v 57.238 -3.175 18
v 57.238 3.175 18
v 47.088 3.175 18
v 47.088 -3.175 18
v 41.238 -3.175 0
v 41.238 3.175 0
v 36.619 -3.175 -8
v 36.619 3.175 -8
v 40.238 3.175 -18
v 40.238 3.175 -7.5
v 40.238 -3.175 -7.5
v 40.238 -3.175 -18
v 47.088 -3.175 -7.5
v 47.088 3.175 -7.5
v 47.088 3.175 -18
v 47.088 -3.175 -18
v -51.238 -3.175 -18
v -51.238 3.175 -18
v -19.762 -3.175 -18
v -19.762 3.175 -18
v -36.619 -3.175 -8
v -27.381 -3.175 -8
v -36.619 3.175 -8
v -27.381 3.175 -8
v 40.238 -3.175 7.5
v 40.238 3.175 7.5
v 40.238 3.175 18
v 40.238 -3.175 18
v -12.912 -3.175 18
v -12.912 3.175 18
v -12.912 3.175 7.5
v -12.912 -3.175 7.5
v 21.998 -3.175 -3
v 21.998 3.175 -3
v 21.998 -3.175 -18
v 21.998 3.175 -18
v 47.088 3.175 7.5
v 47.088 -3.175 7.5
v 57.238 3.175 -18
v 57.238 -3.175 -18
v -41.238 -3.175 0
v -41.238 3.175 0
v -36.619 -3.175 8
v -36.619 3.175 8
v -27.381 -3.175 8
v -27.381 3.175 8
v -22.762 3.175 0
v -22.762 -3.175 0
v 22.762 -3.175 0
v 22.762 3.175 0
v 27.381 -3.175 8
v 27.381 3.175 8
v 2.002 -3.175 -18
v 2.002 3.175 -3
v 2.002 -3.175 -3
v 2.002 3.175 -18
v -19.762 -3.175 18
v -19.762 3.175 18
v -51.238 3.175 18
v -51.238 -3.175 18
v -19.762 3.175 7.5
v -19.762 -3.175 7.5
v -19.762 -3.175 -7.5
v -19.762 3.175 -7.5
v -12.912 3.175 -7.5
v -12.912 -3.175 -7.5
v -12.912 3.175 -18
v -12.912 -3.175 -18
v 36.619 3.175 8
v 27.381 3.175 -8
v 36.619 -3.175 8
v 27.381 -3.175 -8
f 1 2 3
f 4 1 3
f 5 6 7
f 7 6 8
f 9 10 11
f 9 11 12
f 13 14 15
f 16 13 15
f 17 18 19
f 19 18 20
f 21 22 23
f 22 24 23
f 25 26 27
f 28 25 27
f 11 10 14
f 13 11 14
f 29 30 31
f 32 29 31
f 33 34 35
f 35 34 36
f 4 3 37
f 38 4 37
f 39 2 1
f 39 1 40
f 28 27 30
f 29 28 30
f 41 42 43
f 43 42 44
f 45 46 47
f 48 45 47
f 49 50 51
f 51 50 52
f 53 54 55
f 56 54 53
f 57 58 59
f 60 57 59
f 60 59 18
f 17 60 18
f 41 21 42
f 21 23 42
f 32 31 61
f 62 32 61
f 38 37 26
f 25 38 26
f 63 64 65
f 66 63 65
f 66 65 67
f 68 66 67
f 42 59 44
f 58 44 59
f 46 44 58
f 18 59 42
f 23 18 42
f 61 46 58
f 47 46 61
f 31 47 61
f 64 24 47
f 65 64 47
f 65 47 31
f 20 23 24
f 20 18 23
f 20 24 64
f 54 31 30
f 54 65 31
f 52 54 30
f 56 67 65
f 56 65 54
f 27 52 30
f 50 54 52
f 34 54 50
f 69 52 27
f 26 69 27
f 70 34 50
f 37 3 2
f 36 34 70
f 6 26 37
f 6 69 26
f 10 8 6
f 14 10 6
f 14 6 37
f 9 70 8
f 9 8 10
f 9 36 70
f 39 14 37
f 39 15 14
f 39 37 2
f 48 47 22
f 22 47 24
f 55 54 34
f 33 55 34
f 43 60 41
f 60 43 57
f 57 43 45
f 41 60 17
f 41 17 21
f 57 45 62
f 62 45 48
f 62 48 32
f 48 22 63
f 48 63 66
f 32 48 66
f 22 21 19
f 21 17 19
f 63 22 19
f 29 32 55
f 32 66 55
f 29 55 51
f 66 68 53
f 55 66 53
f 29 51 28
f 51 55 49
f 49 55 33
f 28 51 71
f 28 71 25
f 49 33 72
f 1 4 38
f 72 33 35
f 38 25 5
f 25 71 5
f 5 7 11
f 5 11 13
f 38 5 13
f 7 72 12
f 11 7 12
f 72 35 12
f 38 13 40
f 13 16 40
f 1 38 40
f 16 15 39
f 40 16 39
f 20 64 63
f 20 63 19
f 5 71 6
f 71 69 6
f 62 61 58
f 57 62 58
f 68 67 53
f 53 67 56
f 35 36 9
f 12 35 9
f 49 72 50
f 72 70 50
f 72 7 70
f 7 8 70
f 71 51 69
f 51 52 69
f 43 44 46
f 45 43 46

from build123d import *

# Parameters (mm, degrees)
SKETCH1_W           = 108.475208614
SKETCH1_H           = 90.5
BOSS_EXTRUDE1_DEPTH = 3.175
SKETCH2_W           = 6.85
SKETCH2_H           = 10.5
CUT_EXTRUDE1_DEPTH  = 93.588961798
LPATTERN1_COUNT     = 2
LPATTERN1_PITCH     = 60
SKETCH3_W           = 19.995208614
SKETCH3_H           = 15
CUT_EXTRUDE2_DEPTH  = 93.588961798
SKETCH4_W           = 6.85
SKETCH4_H           = 10.5
CUT_EXTRUDE3_DEPTH  = 93.588961798
SHORT_DEPTH         = 93.588961798


with BuildPart() as part:
    # Sketch1 → Boss-Extrude1 (new, symmetric)
    with BuildSketch(Plane(origin=(0, 0, 0), x_dir=(1, 0, 0), z_dir=(0, 1, 0))):
        with Locations((3, -27.25)):
            Rectangle(SKETCH1_W, SKETCH1_H)
        Polygon((-22.762395693, 0), (-27.381197846, 8), (-36.618802154, 8), (-41.237604307, 0), (-36.618802154, -8), (-27.381197846, -8), align=None, mode=Mode.SUBTRACT)
        Polygon((41.237604307, 0), (36.618802154, 8), (27.381197846, 8), (22.762395693, 0), (27.381197846, -8), (36.618802154, -8), align=None, mode=Mode.SUBTRACT)
    extrude(amount=BOSS_EXTRUDE1_DEPTH, both=True)

    # Sketch2 → Cut-Extrude1 (cut, through all)
    with BuildSketch(Plane(origin=(0, 3.175, 0), x_dir=(1, 0, 0), z_dir=(0, 1, 0))):
        with Locations((-16.337395693, 12.75)):
            Rectangle(SKETCH2_W, SKETCH2_H)
        with Locations((-16.337395693, -67.25)):
            Rectangle(SKETCH2_W, SKETCH2_H)
        with Locations((-16.337395693, -27.25)):
            Rectangle(SKETCH2_W, SKETCH2_H)
    cut_extrude1 = extrude(amount=-CUT_EXTRUDE1_DEPTH, mode=Mode.SUBTRACT)

    # LPattern1: Cut-Extrude1 ×2
    with Locations(*[(i * LPATTERN1_PITCH, 0, 0) for i in range(1, LPATTERN1_COUNT)]):
        add(cut_extrude1, mode=Mode.SUBTRACT)

    # Sketch3 → Cut-Extrude2 (cut, through all)
    with BuildSketch(Plane(origin=(0, 3.175, 0), x_dir=(1, 0, 0), z_dir=(0, 1, 0))):
        with Locations((12, 10.5)):
            Rectangle(SKETCH3_W, SKETCH3_H)
    extrude(amount=-CUT_EXTRUDE2_DEPTH, mode=Mode.SUBTRACT)

    # Sketch4 → Cut-Extrude3 (cut, through all)
    with BuildSketch(Plane(origin=(0, 3.175, 0), x_dir=(1, 0, 0), z_dir=(0, 1, 0))):
        with Locations((50.512604307, -64.25)):
            Rectangle(SKETCH4_W, SKETCH4_H)
        with Locations((50.512604307, -31.95)):
            Rectangle(SKETCH4_W, SKETCH4_H)
    extrude(amount=-CUT_EXTRUDE3_DEPTH, mode=Mode.SUBTRACT)

    # Sketch5 → Short (cut, through all)
    with BuildSketch(Plane(origin=(0, 3.175, 0), x_dir=(1, 0, 0), z_dir=(0, 1, 0))):
        Polygon((-51.237604307, -72.5), (57.237604307, -72.5), (57.237604307, -18), (47.087604307, -18), (47.087604307, -7.5), (40.237604307, -7.5), (40.237604307, -18), (-12.912395693, -18), (-12.912395693, -7.5), (-19.762395693, -7.5), (-19.762395693, -18), (-51.237604307, -18), align=None)
    extrude(amount=-SHORT_DEPTH, mode=Mode.SUBTRACT)


solid = part.part
